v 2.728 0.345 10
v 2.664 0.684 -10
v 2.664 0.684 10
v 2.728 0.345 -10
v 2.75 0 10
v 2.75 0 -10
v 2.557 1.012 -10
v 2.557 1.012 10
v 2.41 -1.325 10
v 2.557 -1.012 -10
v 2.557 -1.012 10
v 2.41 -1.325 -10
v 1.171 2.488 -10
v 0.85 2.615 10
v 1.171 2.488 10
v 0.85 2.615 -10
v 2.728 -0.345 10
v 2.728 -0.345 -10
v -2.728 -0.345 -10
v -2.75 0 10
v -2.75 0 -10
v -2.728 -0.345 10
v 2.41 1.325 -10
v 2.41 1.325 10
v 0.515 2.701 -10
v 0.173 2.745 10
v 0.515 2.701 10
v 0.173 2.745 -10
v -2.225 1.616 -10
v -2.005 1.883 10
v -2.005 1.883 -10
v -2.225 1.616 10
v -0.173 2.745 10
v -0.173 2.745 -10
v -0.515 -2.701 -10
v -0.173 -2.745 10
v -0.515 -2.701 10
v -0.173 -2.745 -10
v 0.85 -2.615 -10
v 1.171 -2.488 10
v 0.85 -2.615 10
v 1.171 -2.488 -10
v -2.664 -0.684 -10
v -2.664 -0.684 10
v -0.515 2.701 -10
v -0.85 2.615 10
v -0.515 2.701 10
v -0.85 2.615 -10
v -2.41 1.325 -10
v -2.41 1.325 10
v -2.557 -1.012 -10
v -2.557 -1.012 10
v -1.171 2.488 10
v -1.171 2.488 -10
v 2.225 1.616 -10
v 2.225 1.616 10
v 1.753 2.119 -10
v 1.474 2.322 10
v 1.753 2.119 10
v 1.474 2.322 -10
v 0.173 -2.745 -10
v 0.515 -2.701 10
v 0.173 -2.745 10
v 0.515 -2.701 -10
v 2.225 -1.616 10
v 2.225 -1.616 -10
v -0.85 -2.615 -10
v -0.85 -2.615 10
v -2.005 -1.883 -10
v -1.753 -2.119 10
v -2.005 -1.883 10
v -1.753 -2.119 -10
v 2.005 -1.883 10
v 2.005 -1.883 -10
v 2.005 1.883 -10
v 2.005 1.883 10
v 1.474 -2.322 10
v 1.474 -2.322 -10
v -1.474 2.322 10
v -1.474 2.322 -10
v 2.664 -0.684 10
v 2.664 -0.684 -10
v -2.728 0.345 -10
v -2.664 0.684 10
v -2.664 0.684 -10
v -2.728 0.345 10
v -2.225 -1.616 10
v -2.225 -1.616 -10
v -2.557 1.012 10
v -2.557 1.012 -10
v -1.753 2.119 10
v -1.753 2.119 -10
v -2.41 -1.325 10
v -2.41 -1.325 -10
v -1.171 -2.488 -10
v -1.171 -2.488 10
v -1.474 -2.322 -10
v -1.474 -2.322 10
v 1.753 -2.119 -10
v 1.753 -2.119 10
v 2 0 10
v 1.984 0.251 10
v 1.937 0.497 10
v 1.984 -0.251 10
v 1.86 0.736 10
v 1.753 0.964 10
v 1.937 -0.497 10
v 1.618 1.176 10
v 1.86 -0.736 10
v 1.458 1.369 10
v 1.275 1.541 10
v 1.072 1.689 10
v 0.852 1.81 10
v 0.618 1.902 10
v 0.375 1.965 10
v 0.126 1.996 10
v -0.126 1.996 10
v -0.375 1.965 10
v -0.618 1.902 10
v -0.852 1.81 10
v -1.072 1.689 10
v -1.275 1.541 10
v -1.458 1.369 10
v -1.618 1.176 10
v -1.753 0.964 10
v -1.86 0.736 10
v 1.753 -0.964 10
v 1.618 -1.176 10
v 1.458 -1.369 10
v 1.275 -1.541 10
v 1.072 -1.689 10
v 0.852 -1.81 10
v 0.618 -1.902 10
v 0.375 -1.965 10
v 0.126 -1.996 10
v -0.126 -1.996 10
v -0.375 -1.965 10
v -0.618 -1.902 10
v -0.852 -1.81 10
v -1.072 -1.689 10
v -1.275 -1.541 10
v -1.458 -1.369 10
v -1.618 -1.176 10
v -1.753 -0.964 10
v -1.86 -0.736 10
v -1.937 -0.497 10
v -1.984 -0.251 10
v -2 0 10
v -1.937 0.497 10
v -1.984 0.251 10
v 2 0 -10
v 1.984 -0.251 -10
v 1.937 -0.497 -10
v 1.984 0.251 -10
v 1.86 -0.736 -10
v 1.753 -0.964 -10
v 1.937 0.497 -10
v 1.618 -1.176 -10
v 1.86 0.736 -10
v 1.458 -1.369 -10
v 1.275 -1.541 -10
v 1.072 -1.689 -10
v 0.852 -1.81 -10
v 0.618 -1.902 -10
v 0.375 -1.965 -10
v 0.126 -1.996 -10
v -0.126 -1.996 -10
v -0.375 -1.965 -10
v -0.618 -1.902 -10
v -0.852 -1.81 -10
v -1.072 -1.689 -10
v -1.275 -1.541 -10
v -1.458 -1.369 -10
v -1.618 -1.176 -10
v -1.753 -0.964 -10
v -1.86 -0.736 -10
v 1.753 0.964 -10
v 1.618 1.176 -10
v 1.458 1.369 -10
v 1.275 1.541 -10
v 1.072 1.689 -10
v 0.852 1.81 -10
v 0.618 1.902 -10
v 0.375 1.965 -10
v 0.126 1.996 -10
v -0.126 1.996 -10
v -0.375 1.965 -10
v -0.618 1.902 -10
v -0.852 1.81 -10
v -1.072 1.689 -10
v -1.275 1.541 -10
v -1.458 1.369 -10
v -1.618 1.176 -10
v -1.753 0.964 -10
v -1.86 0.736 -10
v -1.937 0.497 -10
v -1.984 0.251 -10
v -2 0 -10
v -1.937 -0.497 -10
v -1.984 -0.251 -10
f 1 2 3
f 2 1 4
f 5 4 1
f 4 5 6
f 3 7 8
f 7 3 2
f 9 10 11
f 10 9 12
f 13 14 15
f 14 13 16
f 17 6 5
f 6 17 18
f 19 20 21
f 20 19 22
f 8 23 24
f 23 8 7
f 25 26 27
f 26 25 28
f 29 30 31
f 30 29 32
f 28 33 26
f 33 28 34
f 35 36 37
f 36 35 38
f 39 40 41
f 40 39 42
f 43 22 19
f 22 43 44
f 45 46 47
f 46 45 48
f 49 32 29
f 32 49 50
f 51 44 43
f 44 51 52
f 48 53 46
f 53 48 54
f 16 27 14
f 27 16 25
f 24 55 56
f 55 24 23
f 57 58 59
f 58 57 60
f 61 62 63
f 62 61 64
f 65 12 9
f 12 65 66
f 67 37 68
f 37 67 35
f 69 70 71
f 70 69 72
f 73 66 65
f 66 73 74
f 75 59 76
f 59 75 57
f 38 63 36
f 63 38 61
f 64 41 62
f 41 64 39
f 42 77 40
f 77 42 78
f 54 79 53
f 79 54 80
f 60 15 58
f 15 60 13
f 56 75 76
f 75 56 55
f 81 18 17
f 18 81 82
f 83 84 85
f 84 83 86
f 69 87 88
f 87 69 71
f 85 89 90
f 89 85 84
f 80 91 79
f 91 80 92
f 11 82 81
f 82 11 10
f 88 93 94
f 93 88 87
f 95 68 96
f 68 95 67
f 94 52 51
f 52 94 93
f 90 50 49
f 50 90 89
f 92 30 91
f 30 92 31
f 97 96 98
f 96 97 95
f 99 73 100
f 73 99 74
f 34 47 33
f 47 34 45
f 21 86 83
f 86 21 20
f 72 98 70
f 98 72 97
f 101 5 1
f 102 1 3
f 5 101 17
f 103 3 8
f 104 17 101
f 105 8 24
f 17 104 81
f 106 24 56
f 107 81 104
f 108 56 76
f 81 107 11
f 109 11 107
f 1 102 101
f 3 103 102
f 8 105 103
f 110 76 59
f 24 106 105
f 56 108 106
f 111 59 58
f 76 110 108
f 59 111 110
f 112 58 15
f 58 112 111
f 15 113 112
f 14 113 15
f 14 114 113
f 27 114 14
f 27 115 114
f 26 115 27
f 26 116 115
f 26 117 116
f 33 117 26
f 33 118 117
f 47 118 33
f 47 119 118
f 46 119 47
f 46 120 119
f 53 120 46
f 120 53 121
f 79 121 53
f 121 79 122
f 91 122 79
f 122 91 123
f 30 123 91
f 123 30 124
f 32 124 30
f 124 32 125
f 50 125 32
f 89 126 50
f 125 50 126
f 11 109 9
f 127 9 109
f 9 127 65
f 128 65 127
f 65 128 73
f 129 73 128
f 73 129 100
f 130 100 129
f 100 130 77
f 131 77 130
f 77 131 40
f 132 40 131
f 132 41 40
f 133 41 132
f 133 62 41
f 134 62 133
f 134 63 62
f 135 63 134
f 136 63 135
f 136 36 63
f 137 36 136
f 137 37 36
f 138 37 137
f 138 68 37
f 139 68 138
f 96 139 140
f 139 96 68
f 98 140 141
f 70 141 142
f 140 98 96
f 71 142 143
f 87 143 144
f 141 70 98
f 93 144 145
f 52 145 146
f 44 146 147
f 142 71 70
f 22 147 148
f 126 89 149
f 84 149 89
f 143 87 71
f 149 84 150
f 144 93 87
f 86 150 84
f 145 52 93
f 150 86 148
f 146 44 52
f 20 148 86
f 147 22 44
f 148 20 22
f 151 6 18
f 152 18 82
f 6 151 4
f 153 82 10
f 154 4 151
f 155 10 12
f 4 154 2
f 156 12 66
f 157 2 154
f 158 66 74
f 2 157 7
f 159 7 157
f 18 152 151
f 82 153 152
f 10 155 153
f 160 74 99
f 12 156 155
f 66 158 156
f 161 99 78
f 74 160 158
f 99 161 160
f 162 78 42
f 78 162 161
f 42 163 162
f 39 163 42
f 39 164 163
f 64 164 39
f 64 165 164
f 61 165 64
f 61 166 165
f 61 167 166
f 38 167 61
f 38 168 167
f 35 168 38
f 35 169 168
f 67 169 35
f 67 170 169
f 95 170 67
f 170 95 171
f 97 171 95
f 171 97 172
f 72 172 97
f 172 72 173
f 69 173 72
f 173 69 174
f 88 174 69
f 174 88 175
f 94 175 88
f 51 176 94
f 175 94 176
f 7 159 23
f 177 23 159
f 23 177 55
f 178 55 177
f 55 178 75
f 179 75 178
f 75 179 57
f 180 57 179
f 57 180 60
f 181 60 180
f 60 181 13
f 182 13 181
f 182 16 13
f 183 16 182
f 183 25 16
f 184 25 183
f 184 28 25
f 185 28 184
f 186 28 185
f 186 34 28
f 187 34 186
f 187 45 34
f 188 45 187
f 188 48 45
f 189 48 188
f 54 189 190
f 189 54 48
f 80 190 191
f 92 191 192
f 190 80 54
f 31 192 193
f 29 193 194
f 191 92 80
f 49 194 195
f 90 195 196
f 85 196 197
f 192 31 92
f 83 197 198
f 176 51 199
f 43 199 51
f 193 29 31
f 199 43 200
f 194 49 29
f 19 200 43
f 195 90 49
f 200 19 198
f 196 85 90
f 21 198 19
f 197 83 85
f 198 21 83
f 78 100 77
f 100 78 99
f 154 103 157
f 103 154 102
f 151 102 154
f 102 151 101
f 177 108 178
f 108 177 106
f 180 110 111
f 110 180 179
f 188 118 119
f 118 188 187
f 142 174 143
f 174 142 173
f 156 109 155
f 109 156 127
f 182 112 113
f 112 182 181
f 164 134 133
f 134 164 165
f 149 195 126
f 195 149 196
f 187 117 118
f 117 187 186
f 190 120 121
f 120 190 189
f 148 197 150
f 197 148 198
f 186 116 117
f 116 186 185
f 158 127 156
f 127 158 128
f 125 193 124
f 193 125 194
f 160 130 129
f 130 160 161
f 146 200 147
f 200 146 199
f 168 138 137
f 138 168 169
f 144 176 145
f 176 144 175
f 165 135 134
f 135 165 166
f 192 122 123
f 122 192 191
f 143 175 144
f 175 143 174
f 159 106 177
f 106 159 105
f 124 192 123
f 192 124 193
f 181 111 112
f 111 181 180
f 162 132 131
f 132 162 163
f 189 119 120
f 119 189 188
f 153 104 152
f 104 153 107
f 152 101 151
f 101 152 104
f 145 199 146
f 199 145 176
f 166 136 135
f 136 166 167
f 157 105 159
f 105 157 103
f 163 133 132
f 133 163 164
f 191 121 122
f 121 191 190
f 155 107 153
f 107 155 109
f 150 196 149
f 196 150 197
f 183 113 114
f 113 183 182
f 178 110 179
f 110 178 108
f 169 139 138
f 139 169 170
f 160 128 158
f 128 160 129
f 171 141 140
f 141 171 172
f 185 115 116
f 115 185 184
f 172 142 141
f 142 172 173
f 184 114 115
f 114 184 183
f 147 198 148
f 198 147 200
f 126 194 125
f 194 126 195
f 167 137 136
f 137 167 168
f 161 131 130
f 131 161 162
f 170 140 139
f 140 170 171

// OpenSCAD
$fn = 50;


difference() {
	union() {
		translate(v = [0, 0, -10.0000000000]) {
			cylinder(h = 20, r = 2.7500000000);
		}
	}
	union() {
		translate(v = [0, 0, -100.0000000000]) {
			cylinder(h = 200, r = 2.0000000000);
		}
	}
}
